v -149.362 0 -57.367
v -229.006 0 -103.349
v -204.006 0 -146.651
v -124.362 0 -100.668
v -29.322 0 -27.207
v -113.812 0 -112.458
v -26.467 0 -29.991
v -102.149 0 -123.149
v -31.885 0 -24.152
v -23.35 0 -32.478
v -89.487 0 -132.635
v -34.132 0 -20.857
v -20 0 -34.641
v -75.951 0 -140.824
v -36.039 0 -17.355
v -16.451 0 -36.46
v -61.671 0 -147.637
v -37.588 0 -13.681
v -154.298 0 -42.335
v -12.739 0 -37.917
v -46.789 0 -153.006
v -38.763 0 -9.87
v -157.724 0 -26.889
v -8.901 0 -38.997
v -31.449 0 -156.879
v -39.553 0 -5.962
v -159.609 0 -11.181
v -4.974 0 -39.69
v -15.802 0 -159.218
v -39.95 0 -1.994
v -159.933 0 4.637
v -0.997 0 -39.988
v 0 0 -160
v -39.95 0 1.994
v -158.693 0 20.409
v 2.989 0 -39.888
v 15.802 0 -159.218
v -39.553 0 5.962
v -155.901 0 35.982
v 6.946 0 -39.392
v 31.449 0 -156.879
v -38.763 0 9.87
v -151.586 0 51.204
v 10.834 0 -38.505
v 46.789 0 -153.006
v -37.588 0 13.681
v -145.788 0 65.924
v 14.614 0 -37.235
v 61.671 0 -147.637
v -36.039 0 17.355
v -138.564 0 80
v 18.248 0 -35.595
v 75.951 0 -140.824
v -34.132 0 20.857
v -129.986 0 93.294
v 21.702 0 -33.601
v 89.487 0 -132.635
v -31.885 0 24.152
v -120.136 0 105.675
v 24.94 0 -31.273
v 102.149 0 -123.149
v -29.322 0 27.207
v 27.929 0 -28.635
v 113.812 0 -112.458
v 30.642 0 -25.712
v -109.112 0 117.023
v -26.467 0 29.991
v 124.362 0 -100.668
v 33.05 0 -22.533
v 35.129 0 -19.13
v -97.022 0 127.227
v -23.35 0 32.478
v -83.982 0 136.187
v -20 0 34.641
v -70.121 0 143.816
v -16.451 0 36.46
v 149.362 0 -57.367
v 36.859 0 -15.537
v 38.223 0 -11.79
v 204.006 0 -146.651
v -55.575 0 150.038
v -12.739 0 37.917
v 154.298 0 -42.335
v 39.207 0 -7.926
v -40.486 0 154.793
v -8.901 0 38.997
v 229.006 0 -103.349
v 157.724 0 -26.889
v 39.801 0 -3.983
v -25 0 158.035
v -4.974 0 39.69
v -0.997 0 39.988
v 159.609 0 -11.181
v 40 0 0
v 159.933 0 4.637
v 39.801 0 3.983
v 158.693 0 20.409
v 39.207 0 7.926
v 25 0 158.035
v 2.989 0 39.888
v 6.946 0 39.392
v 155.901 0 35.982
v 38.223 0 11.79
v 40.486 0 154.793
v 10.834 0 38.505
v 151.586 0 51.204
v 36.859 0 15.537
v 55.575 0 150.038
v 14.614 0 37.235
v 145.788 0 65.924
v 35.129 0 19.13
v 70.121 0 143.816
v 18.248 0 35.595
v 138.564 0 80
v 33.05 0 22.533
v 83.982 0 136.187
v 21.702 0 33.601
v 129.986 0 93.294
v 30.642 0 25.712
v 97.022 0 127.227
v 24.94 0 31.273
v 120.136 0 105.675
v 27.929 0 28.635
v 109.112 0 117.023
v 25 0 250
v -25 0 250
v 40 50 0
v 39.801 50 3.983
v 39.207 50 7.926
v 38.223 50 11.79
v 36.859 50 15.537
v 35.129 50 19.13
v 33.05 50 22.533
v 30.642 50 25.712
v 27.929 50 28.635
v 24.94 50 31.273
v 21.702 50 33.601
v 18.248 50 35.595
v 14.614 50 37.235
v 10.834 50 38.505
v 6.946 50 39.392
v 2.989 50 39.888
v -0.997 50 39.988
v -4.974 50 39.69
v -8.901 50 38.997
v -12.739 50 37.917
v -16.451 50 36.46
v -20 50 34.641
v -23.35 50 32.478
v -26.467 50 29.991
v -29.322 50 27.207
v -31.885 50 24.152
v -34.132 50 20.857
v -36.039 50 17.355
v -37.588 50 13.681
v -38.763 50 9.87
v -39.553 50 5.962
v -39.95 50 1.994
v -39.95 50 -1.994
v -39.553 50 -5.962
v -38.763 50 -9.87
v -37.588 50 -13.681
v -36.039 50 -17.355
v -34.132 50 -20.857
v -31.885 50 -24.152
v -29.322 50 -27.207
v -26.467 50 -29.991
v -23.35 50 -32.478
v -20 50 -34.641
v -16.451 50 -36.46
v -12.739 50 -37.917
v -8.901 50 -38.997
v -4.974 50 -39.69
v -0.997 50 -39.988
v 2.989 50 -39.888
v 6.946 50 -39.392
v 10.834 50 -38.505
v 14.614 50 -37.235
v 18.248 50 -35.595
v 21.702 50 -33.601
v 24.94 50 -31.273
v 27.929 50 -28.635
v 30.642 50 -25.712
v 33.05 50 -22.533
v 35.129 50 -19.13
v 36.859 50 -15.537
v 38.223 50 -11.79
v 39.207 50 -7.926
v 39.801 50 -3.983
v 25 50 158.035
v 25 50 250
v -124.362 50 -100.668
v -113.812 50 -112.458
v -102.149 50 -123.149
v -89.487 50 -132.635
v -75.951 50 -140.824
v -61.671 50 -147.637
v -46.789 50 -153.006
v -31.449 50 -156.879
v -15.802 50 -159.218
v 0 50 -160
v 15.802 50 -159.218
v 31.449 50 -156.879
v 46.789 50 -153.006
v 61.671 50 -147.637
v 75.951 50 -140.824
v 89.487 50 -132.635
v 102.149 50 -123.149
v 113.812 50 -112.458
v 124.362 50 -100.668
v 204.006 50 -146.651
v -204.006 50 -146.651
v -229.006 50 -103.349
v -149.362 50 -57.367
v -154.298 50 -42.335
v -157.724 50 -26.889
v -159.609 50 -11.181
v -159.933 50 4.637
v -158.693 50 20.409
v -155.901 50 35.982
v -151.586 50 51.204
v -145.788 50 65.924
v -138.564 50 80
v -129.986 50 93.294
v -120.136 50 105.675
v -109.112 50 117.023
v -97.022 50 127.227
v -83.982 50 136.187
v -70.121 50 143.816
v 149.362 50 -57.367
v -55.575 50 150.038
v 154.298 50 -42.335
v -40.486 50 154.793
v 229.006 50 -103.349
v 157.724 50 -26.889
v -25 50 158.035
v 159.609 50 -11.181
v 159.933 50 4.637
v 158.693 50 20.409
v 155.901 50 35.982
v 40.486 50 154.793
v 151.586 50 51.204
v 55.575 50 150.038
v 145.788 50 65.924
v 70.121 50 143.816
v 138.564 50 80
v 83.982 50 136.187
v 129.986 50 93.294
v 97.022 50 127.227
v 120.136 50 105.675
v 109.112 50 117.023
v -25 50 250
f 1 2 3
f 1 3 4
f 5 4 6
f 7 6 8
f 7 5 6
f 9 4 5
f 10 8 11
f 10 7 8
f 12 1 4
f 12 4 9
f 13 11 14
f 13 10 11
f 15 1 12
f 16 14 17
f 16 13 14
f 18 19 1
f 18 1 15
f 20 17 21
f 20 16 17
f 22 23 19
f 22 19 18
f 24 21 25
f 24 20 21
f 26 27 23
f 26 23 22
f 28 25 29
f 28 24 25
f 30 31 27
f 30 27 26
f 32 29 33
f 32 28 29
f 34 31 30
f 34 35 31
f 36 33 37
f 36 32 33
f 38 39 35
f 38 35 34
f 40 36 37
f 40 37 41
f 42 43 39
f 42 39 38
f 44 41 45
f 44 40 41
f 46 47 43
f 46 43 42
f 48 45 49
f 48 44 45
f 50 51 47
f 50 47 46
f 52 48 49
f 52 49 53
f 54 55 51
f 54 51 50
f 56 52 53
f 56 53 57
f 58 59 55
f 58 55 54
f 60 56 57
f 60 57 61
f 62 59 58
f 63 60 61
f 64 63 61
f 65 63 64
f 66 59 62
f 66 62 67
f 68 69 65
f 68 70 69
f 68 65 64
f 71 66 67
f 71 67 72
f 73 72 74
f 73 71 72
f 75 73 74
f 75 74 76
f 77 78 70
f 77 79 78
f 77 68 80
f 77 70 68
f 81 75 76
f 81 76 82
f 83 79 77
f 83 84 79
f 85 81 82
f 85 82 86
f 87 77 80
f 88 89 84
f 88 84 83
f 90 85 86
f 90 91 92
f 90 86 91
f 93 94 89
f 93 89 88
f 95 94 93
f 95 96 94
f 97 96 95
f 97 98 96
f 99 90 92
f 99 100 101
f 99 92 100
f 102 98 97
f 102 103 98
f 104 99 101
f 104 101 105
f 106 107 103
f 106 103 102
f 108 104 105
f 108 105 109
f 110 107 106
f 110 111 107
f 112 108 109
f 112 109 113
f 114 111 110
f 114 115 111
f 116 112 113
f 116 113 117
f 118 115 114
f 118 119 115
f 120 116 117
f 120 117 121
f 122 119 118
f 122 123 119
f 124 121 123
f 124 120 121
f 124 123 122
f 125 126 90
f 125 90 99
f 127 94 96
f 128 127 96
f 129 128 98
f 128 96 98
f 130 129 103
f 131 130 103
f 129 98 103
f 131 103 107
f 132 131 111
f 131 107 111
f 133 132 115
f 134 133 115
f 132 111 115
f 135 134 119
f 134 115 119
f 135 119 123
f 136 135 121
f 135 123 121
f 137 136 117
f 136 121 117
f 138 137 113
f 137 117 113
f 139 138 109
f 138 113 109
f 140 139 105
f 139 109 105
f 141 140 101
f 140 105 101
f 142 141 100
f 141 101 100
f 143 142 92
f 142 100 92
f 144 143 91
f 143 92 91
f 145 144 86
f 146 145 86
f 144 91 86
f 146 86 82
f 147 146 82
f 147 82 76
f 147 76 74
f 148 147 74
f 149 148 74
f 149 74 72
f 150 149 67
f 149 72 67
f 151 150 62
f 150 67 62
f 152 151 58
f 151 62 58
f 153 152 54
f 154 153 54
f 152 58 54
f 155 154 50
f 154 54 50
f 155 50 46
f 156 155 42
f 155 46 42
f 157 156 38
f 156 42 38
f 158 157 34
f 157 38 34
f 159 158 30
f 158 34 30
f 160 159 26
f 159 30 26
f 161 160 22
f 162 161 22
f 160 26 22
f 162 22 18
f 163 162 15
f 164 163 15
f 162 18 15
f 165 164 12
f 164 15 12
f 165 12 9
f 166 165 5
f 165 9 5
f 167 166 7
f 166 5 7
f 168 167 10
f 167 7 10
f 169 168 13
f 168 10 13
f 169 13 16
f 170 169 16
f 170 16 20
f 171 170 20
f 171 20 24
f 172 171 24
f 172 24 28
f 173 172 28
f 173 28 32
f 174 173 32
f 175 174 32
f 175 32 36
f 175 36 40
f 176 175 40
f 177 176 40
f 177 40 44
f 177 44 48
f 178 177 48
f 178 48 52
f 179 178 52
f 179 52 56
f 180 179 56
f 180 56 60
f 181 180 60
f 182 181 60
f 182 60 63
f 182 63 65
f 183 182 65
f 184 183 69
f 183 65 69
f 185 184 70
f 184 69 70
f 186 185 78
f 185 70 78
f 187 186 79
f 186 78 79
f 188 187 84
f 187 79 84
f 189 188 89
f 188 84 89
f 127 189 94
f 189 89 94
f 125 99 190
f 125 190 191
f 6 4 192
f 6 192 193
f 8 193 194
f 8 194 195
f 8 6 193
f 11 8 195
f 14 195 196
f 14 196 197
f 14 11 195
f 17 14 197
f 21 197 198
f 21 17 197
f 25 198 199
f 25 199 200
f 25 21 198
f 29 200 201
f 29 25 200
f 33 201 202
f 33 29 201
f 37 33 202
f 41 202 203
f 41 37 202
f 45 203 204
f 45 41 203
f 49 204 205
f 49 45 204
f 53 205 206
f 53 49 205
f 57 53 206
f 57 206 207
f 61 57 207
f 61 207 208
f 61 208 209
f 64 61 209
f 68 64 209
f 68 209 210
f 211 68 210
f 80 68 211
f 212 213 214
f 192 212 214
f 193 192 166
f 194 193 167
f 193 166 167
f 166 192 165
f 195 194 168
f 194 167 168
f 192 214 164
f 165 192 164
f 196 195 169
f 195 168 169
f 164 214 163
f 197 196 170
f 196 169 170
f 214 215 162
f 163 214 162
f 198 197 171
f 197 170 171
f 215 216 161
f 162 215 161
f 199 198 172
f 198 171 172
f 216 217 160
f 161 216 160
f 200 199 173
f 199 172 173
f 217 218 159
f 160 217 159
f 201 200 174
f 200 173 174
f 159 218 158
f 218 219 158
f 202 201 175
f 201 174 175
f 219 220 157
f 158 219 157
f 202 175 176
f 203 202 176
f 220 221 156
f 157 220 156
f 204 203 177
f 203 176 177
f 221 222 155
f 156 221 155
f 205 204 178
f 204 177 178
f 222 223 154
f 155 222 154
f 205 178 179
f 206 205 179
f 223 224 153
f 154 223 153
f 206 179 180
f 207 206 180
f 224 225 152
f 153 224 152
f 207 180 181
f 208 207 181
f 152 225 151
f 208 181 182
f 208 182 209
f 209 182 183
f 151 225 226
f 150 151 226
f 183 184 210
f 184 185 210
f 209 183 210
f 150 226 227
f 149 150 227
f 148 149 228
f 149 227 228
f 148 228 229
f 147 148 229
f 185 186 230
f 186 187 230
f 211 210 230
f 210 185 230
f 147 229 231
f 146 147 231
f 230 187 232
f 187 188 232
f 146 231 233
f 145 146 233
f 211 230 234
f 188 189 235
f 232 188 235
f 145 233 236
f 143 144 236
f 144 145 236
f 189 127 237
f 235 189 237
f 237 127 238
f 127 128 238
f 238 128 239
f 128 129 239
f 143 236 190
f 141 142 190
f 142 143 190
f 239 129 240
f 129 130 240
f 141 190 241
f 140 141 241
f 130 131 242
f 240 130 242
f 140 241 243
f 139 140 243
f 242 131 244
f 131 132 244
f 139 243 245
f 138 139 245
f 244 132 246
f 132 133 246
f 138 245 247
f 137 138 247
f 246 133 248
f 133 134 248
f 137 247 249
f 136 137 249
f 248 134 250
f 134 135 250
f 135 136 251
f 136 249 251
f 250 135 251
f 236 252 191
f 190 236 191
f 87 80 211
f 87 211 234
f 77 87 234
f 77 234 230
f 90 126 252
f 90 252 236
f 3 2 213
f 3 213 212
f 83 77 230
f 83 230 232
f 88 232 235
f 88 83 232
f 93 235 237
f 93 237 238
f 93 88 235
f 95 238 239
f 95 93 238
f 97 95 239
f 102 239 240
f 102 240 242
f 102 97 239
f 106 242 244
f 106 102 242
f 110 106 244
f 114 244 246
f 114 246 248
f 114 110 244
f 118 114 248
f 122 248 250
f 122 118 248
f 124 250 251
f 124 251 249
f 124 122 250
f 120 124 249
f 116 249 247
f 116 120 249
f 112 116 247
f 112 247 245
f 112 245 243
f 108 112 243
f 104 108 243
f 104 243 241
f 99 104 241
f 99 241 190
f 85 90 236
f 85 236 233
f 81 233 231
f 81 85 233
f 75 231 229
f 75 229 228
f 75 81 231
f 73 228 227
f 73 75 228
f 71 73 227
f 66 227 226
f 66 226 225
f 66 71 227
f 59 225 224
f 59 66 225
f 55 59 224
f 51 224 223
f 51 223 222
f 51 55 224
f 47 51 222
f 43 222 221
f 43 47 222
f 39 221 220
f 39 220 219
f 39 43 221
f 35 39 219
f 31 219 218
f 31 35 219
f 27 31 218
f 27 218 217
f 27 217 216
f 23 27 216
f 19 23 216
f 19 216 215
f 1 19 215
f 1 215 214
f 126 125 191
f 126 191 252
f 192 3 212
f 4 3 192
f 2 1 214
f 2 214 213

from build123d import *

# Parameters (mm, degrees)
F0_R     = 40
F1_DEPTH = 50


with BuildPart() as f1:
    # F0 (on Front) → F1 (new body)
    with BuildSketch(Plane.XZ):
        with BuildLine():
            Line((-25, 250), (-25, 158.034806))
            ThreePointArc((-25, 158.034806), (-138.564065, 80), (-149.362157, -57.366768))
            Line((-149.362157, -57.366768), (-229.006351, -103.349365))
            Line((-229.006351, -103.349365), (-204.006351, -146.650635))
            Line((-204.006351, -146.650635), (-124.362157, -100.668038))
            ThreePointArc((-124.362157, -100.668038), (0, -160), (124.362157, -100.668038))
            Line((124.362157, -100.668038), (204.006351, -146.650635))
            Line((204.006351, -146.650635), (229.006351, -103.349365))
            Line((229.006351, -103.349365), (149.362157, -57.366768))
            ThreePointArc((149.362157, -57.366768), (138.564065, 80), (25, 158.034806))
            Line((25, 158.034806), (25, 250))
            Line((25, 250), (-25, 250))
        make_face()
        Circle(F0_R, mode=Mode.SUBTRACT)
    extrude(amount=-F1_DEPTH)


solid = f1.part
